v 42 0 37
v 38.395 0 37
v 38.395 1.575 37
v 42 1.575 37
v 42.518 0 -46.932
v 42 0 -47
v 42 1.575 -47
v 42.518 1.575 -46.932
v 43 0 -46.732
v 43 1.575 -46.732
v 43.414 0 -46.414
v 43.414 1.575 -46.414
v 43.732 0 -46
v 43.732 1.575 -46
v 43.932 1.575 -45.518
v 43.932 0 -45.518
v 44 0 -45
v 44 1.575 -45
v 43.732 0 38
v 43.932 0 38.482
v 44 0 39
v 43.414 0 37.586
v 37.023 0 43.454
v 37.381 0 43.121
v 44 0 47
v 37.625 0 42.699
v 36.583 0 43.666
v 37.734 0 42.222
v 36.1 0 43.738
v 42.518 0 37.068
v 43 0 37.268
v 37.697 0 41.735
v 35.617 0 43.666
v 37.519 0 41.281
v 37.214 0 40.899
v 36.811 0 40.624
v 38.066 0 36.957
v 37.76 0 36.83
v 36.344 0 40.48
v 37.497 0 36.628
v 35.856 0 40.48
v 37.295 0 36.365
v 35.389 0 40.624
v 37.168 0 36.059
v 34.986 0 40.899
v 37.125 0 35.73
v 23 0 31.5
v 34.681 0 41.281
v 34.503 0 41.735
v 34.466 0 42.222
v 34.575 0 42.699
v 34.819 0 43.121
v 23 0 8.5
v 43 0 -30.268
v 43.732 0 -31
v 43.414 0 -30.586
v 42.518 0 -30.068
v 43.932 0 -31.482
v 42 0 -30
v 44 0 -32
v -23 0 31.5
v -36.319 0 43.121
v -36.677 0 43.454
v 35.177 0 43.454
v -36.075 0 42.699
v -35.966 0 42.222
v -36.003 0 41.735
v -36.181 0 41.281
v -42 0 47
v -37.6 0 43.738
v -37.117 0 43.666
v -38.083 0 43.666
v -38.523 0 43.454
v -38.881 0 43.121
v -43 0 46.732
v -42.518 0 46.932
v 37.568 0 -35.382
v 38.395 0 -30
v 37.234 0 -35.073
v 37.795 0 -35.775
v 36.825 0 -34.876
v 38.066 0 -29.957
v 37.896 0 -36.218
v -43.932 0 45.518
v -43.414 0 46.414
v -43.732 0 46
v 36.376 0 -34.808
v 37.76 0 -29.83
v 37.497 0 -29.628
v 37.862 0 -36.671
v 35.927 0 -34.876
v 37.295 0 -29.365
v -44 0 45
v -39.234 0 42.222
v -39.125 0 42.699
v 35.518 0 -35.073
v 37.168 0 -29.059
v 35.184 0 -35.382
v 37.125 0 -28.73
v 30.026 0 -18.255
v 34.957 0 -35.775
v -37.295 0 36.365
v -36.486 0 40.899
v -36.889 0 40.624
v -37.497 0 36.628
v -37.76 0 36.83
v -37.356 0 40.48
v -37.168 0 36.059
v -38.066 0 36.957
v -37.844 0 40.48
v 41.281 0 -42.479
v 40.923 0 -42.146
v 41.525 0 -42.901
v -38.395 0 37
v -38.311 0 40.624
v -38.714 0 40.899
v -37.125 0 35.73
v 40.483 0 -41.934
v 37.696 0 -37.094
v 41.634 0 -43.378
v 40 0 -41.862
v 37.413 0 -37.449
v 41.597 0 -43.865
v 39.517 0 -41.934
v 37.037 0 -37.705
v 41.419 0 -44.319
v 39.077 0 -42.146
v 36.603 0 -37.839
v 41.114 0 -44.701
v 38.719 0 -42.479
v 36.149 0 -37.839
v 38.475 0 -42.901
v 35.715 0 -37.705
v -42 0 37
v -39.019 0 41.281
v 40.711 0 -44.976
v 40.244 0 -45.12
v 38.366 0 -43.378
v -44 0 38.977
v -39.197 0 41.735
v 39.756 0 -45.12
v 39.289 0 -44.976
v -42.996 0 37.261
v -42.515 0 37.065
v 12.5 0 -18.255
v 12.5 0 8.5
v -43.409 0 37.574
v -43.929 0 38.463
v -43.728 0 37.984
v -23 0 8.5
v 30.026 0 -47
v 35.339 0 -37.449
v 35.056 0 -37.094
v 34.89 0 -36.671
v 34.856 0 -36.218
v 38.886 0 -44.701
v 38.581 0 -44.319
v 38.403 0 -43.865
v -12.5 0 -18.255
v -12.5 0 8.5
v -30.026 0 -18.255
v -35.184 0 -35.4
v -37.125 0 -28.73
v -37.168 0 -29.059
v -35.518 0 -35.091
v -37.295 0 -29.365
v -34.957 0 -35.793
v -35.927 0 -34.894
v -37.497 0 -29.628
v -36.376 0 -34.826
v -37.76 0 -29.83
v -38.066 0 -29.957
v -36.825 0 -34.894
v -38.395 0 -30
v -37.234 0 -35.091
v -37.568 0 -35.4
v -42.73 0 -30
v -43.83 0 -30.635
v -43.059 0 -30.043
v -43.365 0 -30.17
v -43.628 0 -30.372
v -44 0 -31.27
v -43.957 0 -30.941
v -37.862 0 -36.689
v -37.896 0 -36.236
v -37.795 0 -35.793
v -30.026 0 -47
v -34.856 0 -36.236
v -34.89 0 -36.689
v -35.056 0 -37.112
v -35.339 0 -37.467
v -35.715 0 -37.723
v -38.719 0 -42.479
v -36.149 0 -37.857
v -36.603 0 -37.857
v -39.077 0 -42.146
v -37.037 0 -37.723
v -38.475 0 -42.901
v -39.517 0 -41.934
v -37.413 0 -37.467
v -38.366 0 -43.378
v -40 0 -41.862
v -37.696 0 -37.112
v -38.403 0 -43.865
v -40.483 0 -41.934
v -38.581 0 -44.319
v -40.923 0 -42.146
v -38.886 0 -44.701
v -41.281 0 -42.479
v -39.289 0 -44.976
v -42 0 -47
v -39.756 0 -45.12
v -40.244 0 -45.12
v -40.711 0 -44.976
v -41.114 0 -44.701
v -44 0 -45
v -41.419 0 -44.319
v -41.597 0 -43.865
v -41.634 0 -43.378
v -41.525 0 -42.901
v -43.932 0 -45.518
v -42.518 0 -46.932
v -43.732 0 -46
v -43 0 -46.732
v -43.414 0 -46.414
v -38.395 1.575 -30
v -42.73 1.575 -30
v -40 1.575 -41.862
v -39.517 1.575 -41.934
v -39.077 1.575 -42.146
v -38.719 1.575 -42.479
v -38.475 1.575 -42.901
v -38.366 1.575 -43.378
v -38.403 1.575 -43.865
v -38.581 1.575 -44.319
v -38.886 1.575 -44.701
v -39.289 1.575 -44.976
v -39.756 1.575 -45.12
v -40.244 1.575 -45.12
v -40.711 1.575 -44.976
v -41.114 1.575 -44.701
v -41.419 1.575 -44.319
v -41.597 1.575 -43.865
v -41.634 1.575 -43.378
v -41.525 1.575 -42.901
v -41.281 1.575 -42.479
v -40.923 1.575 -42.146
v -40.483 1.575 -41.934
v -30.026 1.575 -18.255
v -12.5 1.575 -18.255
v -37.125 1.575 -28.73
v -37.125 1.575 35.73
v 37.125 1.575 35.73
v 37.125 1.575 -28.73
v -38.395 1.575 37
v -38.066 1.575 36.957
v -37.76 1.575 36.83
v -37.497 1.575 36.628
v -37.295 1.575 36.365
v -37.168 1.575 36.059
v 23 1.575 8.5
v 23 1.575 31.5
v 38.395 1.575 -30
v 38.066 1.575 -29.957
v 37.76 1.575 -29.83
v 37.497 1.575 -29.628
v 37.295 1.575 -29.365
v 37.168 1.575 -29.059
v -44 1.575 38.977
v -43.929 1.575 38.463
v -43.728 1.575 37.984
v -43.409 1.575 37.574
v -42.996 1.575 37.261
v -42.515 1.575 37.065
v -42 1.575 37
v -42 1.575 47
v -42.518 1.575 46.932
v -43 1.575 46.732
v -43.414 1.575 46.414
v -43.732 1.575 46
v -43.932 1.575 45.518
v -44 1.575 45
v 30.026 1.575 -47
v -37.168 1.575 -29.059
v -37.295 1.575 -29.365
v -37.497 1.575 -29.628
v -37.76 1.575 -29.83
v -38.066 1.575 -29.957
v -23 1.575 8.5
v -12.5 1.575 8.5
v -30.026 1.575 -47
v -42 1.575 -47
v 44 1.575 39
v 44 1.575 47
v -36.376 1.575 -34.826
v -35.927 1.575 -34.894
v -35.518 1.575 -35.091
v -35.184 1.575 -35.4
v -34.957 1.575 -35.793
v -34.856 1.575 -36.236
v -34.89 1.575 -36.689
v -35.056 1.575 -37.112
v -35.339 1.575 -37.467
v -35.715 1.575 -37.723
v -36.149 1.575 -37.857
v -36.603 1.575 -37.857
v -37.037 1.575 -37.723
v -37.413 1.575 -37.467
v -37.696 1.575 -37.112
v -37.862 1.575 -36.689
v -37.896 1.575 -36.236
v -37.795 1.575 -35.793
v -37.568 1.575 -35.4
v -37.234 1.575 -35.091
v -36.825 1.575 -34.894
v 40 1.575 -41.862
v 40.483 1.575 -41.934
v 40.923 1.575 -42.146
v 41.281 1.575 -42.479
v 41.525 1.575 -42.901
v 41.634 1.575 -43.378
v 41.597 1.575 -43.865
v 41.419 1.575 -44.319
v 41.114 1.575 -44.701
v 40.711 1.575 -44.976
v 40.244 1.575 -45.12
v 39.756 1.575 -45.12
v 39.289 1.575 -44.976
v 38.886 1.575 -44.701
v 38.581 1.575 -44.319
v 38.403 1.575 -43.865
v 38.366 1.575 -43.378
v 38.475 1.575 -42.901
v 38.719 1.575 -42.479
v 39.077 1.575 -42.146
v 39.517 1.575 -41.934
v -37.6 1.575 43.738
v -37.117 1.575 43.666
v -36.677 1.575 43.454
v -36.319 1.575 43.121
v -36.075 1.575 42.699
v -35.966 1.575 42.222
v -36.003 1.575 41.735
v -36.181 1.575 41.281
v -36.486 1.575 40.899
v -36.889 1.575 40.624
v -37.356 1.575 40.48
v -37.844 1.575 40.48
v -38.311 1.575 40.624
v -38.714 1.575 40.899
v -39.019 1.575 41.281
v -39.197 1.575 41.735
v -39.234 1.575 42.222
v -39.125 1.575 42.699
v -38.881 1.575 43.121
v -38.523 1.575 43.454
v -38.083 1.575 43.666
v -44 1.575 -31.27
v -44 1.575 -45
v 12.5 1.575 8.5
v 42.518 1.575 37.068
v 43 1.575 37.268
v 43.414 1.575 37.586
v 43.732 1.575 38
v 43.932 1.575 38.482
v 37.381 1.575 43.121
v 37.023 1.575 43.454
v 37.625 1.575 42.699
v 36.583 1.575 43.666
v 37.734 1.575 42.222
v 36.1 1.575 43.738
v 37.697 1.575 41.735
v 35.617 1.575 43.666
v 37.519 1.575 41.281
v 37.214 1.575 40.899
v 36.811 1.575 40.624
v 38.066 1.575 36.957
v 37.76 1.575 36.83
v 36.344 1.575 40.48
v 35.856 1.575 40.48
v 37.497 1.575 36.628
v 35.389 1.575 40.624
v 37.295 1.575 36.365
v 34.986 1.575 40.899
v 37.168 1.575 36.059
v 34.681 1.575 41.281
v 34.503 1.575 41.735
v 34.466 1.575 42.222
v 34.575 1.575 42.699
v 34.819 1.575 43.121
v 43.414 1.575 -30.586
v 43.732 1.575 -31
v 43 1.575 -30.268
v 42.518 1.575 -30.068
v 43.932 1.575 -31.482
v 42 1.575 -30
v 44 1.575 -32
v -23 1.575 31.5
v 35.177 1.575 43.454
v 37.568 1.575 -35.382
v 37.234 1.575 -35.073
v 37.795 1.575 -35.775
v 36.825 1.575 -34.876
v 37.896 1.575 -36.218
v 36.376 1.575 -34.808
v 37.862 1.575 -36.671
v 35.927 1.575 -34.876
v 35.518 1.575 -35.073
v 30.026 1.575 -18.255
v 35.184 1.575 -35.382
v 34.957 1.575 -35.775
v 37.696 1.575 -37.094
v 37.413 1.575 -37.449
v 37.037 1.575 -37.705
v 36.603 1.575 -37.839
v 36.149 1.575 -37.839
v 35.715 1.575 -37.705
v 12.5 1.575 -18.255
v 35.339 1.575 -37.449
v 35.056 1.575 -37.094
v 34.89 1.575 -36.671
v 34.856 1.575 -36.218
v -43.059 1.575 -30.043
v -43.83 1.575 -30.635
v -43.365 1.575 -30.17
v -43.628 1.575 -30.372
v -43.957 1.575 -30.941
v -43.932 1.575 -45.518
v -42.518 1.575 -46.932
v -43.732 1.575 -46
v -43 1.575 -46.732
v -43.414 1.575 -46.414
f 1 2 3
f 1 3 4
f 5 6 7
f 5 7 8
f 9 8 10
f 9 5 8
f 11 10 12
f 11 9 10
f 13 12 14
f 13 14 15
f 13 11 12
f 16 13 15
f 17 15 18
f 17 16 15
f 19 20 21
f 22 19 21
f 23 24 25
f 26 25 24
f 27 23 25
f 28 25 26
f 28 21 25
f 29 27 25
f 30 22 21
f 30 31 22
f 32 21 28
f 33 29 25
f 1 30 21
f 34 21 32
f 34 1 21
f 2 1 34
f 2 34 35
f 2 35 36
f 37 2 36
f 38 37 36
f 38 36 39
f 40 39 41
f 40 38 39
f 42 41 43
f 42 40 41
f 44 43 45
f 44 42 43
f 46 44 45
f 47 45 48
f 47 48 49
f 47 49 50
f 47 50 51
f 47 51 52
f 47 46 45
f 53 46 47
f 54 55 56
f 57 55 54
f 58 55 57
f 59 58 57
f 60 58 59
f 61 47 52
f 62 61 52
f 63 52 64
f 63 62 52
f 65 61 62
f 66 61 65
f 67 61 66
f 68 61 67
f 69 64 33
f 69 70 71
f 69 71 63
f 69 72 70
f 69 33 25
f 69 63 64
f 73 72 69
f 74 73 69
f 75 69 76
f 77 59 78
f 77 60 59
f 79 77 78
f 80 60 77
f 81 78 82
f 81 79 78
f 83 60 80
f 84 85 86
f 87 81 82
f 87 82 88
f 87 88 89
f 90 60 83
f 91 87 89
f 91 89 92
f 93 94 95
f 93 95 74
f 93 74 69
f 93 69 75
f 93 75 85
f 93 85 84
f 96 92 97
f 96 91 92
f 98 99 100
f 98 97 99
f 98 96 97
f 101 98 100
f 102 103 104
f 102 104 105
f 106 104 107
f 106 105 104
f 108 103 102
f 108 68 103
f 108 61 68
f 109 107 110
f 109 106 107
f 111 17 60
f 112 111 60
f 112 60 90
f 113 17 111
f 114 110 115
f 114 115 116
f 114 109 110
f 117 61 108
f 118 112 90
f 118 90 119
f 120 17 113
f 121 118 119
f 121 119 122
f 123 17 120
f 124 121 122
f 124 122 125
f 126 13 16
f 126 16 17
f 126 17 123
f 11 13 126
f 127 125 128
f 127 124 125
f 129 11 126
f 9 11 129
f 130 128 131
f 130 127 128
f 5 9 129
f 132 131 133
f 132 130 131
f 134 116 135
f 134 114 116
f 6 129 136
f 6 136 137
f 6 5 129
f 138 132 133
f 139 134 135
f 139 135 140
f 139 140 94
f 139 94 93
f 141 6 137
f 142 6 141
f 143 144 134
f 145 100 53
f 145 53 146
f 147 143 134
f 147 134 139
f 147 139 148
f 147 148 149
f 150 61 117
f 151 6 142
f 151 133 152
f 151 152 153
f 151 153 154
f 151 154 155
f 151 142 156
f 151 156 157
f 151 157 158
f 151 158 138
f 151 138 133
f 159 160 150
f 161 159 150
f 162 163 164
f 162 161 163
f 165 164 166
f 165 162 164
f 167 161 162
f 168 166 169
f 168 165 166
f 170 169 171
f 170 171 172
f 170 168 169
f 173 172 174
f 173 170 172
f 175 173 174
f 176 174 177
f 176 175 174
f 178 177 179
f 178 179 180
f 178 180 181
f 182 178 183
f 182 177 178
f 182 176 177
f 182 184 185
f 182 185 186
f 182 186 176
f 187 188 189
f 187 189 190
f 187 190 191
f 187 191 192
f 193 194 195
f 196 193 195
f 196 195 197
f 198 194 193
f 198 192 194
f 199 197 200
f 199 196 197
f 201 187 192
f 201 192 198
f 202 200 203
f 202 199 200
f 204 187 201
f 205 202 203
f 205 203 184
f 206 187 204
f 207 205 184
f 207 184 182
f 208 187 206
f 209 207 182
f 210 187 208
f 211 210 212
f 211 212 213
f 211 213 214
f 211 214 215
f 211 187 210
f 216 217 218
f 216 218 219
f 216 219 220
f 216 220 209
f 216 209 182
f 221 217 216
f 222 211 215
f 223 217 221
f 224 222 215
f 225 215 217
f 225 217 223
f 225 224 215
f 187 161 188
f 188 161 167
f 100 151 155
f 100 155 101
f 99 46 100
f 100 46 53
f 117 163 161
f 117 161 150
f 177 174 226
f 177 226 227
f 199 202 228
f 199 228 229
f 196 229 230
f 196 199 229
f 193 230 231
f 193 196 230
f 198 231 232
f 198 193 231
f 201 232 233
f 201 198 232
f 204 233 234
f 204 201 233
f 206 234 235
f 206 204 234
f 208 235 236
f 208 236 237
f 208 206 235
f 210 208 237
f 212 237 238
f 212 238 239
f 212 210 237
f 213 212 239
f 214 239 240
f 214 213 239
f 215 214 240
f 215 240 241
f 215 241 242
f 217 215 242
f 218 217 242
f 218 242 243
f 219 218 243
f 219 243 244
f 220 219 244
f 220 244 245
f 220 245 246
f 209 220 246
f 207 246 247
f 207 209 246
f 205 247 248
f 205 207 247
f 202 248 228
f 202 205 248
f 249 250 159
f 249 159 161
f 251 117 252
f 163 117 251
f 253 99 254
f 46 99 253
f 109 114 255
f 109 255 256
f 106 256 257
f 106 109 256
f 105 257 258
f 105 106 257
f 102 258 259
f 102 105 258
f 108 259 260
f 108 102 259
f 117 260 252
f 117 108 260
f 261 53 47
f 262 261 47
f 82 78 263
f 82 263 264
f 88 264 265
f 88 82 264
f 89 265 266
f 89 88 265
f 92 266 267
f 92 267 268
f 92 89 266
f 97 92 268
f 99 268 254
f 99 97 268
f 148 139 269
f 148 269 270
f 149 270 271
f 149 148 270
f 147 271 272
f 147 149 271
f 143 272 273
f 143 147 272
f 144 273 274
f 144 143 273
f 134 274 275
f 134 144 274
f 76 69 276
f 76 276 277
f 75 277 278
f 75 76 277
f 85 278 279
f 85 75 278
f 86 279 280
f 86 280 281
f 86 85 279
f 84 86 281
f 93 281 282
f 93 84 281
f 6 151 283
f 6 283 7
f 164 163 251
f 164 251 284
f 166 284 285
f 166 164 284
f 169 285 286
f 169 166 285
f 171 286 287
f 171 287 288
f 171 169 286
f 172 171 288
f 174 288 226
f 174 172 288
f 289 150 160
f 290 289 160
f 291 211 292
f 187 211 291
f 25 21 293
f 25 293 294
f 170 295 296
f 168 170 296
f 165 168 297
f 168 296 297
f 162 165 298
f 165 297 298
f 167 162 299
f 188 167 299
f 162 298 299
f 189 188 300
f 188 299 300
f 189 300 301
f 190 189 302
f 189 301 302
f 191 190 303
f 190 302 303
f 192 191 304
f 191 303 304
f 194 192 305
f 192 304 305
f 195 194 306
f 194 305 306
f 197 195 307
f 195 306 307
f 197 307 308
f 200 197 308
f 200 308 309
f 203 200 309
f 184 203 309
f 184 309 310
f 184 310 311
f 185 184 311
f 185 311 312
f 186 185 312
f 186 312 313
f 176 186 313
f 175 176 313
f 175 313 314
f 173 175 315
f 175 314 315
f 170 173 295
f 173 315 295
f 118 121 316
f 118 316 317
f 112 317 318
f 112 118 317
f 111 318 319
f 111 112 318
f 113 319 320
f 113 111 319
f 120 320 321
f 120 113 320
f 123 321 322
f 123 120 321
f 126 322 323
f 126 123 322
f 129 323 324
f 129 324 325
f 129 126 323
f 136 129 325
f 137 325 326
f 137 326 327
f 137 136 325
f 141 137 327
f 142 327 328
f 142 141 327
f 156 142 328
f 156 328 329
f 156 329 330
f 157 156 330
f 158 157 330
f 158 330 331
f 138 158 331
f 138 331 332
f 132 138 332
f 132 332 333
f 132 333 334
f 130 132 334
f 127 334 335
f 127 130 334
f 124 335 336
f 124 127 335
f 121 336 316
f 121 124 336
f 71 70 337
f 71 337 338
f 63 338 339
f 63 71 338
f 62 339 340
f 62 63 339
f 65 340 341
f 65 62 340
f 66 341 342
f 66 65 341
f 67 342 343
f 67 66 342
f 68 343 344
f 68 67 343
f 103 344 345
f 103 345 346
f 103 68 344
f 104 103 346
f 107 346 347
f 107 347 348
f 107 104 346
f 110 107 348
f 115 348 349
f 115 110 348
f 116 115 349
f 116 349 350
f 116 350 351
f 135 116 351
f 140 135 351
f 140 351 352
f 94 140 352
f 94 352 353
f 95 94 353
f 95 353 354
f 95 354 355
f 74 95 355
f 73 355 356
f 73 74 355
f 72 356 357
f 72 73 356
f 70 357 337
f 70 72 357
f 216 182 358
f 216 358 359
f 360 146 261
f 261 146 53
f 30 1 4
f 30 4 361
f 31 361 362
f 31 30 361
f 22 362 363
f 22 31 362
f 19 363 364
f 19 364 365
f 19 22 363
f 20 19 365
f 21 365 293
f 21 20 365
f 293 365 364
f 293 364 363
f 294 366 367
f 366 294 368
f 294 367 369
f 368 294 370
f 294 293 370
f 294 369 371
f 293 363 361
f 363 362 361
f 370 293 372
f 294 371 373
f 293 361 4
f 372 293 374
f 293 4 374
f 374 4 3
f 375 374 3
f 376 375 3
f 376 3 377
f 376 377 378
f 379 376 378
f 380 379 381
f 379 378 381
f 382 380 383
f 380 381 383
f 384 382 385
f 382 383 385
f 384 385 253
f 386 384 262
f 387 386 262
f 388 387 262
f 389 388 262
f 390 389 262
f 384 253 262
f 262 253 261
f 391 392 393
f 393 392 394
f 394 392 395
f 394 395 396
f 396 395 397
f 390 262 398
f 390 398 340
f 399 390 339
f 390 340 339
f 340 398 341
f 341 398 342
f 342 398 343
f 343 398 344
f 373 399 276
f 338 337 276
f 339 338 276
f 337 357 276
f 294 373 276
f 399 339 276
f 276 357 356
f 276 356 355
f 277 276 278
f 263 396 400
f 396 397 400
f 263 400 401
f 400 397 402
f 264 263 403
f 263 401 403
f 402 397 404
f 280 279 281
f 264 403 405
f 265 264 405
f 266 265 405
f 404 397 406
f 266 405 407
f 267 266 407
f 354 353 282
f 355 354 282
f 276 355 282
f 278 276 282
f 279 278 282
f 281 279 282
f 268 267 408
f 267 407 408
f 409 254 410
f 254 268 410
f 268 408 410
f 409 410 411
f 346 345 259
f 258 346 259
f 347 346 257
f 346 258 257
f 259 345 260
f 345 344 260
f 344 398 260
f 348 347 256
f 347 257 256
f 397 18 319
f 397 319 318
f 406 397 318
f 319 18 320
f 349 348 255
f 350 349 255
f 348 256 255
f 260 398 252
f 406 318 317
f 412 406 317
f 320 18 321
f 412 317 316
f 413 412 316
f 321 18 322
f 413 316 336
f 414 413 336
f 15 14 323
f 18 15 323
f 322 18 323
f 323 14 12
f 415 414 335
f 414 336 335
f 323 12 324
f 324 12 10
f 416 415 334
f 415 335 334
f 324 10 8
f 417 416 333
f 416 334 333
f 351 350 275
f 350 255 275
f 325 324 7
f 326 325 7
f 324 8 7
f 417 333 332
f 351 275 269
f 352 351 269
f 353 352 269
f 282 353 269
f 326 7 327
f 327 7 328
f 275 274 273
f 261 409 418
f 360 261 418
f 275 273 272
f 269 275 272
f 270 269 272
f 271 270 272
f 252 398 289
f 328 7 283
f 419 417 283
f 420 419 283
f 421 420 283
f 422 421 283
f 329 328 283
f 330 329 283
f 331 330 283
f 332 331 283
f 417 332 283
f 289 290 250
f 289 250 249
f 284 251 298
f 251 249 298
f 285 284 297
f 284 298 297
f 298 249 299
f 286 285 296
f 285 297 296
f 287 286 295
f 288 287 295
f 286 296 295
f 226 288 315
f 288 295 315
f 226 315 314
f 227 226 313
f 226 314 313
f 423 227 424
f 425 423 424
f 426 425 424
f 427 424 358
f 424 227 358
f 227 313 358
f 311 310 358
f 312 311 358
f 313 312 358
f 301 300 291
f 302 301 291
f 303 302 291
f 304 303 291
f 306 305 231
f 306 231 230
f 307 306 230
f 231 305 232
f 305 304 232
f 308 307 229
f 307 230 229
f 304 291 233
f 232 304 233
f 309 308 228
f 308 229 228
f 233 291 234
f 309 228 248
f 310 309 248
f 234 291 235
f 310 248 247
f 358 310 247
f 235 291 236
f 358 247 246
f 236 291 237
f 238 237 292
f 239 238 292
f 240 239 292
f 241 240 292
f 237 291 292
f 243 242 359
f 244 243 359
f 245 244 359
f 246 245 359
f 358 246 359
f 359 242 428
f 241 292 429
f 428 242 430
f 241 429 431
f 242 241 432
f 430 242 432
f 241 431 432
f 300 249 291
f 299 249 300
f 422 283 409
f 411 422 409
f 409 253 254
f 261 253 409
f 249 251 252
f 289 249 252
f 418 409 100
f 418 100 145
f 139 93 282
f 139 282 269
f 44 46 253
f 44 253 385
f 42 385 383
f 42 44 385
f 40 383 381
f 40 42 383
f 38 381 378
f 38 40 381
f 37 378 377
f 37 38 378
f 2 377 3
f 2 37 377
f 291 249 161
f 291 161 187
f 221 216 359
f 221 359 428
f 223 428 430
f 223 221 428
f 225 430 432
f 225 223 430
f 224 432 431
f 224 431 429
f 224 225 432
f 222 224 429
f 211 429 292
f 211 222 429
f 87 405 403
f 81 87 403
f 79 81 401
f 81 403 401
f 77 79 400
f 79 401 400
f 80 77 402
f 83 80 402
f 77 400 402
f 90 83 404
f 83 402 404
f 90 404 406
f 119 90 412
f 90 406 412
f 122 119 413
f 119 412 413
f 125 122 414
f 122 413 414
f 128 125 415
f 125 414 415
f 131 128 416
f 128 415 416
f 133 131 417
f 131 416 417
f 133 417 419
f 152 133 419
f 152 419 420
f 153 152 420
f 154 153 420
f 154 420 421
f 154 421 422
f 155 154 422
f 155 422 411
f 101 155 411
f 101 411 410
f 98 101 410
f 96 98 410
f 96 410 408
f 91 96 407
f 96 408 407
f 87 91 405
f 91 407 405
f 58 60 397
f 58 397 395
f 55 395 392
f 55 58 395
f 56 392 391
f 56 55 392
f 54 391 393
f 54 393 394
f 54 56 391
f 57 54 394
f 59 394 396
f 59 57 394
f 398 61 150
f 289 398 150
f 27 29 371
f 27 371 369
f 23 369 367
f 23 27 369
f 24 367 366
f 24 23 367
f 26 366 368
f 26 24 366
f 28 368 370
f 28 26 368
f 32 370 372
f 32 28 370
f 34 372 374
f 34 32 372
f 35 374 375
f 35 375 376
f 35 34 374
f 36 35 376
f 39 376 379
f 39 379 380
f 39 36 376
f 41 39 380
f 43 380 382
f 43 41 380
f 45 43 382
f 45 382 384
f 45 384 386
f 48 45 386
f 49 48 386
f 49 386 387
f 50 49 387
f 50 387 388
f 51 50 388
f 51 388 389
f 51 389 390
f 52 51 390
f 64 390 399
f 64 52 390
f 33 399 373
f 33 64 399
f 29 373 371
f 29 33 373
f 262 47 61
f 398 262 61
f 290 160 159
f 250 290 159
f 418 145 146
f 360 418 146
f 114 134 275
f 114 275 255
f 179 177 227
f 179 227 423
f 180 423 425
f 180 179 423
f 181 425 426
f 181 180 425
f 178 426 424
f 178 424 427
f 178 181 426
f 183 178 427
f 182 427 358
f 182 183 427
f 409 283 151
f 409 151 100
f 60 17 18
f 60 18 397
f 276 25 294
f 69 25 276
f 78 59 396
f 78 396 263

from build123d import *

# Parameters (mm, degrees)
SKETCH1_R           = 1.6383
BOSS_EXTRUDE1_DEPTH = 1.575
CUT_EXTRUDE1_DEPTH  = 2.54
SKETCH15_R          = 1.524
CUT_EXTRUDE5_DEPTH  = 1.575


with BuildPart() as part:
    # Sketch1 → Boss-Extrude1 (new body)
    with BuildSketch(Plane(origin=(0, 0, 0), x_dir=(1, 0, 0), z_dir=(0, 1, 0))):
        with BuildLine():
            Line((-38.395, 30), (-42.73, 30))
            ThreePointArc((-42.73, 30), (-43.628025612, 30.371974388), (-44, 31.27))
            Line((-44, 31.27), (-44, 45))
            ThreePointArc((-44, 45), (-43.414213562, 46.414213562), (-42, 47))
            Line((-42, 47), (42, 47))
            ThreePointArc((42, 47), (43.414213562, 46.414213562), (44, 45))
            Line((44, 45), (44, 32))
            ThreePointArc((44, 32), (43.414213562, 30.585786438), (42, 30))
            Line((42, 30), (38.395, 30))
            ThreePointArc((38.395, 30), (37.496974388, 29.628025612), (37.125, 28.73))
            Line((37.125, 28.73), (37.125, -35.73))
            ThreePointArc((37.125, -35.73), (37.496974388, -36.628025612), (38.395, -37))
            Line((38.395, -37), (42, -37))
            ThreePointArc((42, -37), (43.414213562, -37.585786438), (44, -39))
            Line((44, -39), (44, -47))
            Line((44, -47), (-42, -47))
            ThreePointArc((-42, -47), (-43.414213562, -46.414213562), (-44, -45))
            Line((-44, -45), (-44, -38.977))
            ThreePointArc((-44, -38.977), (-43.40945979, -37.574276641), (-42, -37))
            Line((-42, -37), (-38.395, -37))
            ThreePointArc((-38.395, -37), (-37.496974388, -36.628025612), (-37.125, -35.73))
            Line((-37.125, -35.73), (-37.125, 28.73))
            ThreePointArc((-37.125, 28.73), (-37.496974388, 29.628025612), (-38.395, 30))
        make_face()
        with Locations(Location((40, 43.5, 0), (0, 0, 270))):
            Circle(SKETCH1_R, mode=Mode.SUBTRACT)
        with Locations(Location((-40, 43.5, 0), (0, 0, 270))):
            Circle(SKETCH1_R, mode=Mode.SUBTRACT)
        with Locations(Location((-37.6, -42.1, 0), (0, 0, 270))):
            Circle(SKETCH1_R, mode=Mode.SUBTRACT)
        with Locations(Location((36.1, -42.1, 0), (0, 0, 270))):
            Circle(SKETCH1_R, mode=Mode.SUBTRACT)
        Polygon((23, -31.5), (-23, -31.5), (-23, -8.5), (-12.5, -8.5), (-12.5, 35), (12.5, 35), (12.5, -8.5), (23, -8.5), align=None, mode=Mode.SUBTRACT)
    extrude(amount=BOSS_EXTRUDE1_DEPTH)

    # Sketch2 → Cut-Extrude1 (cut)
    with BuildSketch(Plane(origin=(0, 1.575, 0), x_dir=(1, 0, 0), z_dir=(0, 1, 0))):
        Polygon((-12.5, 18.255354416), (-30.026, 18.255354416), (-30.026, 47), (30.026, 47), (30.026, 18.255354416), (12.5, 18.255354416), (12.5, 35), (-12.5, 35), align=None)
    extrude(amount=-CUT_EXTRUDE1_DEPTH, mode=Mode.SUBTRACT)

    # Sketch15 → Cut-Extrude5 (cut)
    with BuildSketch(Plane(origin=(0, 1.575, 0), x_dir=(1, 0, 0), z_dir=(0, 1, 0))):
        with Locations(Location((-36.376, 36.35, 0), (0, 0, 270))):
            Circle(SKETCH15_R)
        with Locations(Location((36.376, 36.332, 0), (0, 0, 270))):
            Circle(SKETCH15_R)
    extrude(amount=-CUT_EXTRUDE5_DEPTH, mode=Mode.SUBTRACT)


solid = part.part
